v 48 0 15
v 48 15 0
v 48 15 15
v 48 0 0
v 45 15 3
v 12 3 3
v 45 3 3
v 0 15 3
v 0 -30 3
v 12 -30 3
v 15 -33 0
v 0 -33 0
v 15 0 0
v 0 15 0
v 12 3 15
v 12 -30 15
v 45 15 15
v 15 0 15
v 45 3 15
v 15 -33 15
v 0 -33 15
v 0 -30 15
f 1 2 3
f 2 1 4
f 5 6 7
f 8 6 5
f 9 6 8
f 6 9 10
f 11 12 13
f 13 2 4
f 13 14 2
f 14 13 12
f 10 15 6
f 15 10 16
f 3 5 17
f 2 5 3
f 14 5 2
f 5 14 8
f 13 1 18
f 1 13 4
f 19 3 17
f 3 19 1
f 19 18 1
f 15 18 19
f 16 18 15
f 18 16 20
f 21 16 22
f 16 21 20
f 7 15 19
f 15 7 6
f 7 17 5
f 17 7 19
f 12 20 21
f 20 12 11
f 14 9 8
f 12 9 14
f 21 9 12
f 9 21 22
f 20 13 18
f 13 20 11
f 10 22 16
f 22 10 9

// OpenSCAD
wall_thickness=3;

height=15;

l1=44;
l2=11;

l3=20;



module corner(l, h, t, side) {
    cube([l, h, t]);
    cube([l, t, h]);
    if (side==1 || side==3) cube([t, h, h]);
    if (side==2 || side==3) translate([l-t, 0, 0]) cube([t, h, h]);
}
  
length = l1-l2;
translate([height-wall_thickness, 0, 0]) corner(length+wall_thickness, height, wall_thickness, 2);
translate([height, -length, 0])
  rotate([0, 0, 90]) corner(length, height, wall_thickness, 1);

cube([height, height, wall_thickness]);
